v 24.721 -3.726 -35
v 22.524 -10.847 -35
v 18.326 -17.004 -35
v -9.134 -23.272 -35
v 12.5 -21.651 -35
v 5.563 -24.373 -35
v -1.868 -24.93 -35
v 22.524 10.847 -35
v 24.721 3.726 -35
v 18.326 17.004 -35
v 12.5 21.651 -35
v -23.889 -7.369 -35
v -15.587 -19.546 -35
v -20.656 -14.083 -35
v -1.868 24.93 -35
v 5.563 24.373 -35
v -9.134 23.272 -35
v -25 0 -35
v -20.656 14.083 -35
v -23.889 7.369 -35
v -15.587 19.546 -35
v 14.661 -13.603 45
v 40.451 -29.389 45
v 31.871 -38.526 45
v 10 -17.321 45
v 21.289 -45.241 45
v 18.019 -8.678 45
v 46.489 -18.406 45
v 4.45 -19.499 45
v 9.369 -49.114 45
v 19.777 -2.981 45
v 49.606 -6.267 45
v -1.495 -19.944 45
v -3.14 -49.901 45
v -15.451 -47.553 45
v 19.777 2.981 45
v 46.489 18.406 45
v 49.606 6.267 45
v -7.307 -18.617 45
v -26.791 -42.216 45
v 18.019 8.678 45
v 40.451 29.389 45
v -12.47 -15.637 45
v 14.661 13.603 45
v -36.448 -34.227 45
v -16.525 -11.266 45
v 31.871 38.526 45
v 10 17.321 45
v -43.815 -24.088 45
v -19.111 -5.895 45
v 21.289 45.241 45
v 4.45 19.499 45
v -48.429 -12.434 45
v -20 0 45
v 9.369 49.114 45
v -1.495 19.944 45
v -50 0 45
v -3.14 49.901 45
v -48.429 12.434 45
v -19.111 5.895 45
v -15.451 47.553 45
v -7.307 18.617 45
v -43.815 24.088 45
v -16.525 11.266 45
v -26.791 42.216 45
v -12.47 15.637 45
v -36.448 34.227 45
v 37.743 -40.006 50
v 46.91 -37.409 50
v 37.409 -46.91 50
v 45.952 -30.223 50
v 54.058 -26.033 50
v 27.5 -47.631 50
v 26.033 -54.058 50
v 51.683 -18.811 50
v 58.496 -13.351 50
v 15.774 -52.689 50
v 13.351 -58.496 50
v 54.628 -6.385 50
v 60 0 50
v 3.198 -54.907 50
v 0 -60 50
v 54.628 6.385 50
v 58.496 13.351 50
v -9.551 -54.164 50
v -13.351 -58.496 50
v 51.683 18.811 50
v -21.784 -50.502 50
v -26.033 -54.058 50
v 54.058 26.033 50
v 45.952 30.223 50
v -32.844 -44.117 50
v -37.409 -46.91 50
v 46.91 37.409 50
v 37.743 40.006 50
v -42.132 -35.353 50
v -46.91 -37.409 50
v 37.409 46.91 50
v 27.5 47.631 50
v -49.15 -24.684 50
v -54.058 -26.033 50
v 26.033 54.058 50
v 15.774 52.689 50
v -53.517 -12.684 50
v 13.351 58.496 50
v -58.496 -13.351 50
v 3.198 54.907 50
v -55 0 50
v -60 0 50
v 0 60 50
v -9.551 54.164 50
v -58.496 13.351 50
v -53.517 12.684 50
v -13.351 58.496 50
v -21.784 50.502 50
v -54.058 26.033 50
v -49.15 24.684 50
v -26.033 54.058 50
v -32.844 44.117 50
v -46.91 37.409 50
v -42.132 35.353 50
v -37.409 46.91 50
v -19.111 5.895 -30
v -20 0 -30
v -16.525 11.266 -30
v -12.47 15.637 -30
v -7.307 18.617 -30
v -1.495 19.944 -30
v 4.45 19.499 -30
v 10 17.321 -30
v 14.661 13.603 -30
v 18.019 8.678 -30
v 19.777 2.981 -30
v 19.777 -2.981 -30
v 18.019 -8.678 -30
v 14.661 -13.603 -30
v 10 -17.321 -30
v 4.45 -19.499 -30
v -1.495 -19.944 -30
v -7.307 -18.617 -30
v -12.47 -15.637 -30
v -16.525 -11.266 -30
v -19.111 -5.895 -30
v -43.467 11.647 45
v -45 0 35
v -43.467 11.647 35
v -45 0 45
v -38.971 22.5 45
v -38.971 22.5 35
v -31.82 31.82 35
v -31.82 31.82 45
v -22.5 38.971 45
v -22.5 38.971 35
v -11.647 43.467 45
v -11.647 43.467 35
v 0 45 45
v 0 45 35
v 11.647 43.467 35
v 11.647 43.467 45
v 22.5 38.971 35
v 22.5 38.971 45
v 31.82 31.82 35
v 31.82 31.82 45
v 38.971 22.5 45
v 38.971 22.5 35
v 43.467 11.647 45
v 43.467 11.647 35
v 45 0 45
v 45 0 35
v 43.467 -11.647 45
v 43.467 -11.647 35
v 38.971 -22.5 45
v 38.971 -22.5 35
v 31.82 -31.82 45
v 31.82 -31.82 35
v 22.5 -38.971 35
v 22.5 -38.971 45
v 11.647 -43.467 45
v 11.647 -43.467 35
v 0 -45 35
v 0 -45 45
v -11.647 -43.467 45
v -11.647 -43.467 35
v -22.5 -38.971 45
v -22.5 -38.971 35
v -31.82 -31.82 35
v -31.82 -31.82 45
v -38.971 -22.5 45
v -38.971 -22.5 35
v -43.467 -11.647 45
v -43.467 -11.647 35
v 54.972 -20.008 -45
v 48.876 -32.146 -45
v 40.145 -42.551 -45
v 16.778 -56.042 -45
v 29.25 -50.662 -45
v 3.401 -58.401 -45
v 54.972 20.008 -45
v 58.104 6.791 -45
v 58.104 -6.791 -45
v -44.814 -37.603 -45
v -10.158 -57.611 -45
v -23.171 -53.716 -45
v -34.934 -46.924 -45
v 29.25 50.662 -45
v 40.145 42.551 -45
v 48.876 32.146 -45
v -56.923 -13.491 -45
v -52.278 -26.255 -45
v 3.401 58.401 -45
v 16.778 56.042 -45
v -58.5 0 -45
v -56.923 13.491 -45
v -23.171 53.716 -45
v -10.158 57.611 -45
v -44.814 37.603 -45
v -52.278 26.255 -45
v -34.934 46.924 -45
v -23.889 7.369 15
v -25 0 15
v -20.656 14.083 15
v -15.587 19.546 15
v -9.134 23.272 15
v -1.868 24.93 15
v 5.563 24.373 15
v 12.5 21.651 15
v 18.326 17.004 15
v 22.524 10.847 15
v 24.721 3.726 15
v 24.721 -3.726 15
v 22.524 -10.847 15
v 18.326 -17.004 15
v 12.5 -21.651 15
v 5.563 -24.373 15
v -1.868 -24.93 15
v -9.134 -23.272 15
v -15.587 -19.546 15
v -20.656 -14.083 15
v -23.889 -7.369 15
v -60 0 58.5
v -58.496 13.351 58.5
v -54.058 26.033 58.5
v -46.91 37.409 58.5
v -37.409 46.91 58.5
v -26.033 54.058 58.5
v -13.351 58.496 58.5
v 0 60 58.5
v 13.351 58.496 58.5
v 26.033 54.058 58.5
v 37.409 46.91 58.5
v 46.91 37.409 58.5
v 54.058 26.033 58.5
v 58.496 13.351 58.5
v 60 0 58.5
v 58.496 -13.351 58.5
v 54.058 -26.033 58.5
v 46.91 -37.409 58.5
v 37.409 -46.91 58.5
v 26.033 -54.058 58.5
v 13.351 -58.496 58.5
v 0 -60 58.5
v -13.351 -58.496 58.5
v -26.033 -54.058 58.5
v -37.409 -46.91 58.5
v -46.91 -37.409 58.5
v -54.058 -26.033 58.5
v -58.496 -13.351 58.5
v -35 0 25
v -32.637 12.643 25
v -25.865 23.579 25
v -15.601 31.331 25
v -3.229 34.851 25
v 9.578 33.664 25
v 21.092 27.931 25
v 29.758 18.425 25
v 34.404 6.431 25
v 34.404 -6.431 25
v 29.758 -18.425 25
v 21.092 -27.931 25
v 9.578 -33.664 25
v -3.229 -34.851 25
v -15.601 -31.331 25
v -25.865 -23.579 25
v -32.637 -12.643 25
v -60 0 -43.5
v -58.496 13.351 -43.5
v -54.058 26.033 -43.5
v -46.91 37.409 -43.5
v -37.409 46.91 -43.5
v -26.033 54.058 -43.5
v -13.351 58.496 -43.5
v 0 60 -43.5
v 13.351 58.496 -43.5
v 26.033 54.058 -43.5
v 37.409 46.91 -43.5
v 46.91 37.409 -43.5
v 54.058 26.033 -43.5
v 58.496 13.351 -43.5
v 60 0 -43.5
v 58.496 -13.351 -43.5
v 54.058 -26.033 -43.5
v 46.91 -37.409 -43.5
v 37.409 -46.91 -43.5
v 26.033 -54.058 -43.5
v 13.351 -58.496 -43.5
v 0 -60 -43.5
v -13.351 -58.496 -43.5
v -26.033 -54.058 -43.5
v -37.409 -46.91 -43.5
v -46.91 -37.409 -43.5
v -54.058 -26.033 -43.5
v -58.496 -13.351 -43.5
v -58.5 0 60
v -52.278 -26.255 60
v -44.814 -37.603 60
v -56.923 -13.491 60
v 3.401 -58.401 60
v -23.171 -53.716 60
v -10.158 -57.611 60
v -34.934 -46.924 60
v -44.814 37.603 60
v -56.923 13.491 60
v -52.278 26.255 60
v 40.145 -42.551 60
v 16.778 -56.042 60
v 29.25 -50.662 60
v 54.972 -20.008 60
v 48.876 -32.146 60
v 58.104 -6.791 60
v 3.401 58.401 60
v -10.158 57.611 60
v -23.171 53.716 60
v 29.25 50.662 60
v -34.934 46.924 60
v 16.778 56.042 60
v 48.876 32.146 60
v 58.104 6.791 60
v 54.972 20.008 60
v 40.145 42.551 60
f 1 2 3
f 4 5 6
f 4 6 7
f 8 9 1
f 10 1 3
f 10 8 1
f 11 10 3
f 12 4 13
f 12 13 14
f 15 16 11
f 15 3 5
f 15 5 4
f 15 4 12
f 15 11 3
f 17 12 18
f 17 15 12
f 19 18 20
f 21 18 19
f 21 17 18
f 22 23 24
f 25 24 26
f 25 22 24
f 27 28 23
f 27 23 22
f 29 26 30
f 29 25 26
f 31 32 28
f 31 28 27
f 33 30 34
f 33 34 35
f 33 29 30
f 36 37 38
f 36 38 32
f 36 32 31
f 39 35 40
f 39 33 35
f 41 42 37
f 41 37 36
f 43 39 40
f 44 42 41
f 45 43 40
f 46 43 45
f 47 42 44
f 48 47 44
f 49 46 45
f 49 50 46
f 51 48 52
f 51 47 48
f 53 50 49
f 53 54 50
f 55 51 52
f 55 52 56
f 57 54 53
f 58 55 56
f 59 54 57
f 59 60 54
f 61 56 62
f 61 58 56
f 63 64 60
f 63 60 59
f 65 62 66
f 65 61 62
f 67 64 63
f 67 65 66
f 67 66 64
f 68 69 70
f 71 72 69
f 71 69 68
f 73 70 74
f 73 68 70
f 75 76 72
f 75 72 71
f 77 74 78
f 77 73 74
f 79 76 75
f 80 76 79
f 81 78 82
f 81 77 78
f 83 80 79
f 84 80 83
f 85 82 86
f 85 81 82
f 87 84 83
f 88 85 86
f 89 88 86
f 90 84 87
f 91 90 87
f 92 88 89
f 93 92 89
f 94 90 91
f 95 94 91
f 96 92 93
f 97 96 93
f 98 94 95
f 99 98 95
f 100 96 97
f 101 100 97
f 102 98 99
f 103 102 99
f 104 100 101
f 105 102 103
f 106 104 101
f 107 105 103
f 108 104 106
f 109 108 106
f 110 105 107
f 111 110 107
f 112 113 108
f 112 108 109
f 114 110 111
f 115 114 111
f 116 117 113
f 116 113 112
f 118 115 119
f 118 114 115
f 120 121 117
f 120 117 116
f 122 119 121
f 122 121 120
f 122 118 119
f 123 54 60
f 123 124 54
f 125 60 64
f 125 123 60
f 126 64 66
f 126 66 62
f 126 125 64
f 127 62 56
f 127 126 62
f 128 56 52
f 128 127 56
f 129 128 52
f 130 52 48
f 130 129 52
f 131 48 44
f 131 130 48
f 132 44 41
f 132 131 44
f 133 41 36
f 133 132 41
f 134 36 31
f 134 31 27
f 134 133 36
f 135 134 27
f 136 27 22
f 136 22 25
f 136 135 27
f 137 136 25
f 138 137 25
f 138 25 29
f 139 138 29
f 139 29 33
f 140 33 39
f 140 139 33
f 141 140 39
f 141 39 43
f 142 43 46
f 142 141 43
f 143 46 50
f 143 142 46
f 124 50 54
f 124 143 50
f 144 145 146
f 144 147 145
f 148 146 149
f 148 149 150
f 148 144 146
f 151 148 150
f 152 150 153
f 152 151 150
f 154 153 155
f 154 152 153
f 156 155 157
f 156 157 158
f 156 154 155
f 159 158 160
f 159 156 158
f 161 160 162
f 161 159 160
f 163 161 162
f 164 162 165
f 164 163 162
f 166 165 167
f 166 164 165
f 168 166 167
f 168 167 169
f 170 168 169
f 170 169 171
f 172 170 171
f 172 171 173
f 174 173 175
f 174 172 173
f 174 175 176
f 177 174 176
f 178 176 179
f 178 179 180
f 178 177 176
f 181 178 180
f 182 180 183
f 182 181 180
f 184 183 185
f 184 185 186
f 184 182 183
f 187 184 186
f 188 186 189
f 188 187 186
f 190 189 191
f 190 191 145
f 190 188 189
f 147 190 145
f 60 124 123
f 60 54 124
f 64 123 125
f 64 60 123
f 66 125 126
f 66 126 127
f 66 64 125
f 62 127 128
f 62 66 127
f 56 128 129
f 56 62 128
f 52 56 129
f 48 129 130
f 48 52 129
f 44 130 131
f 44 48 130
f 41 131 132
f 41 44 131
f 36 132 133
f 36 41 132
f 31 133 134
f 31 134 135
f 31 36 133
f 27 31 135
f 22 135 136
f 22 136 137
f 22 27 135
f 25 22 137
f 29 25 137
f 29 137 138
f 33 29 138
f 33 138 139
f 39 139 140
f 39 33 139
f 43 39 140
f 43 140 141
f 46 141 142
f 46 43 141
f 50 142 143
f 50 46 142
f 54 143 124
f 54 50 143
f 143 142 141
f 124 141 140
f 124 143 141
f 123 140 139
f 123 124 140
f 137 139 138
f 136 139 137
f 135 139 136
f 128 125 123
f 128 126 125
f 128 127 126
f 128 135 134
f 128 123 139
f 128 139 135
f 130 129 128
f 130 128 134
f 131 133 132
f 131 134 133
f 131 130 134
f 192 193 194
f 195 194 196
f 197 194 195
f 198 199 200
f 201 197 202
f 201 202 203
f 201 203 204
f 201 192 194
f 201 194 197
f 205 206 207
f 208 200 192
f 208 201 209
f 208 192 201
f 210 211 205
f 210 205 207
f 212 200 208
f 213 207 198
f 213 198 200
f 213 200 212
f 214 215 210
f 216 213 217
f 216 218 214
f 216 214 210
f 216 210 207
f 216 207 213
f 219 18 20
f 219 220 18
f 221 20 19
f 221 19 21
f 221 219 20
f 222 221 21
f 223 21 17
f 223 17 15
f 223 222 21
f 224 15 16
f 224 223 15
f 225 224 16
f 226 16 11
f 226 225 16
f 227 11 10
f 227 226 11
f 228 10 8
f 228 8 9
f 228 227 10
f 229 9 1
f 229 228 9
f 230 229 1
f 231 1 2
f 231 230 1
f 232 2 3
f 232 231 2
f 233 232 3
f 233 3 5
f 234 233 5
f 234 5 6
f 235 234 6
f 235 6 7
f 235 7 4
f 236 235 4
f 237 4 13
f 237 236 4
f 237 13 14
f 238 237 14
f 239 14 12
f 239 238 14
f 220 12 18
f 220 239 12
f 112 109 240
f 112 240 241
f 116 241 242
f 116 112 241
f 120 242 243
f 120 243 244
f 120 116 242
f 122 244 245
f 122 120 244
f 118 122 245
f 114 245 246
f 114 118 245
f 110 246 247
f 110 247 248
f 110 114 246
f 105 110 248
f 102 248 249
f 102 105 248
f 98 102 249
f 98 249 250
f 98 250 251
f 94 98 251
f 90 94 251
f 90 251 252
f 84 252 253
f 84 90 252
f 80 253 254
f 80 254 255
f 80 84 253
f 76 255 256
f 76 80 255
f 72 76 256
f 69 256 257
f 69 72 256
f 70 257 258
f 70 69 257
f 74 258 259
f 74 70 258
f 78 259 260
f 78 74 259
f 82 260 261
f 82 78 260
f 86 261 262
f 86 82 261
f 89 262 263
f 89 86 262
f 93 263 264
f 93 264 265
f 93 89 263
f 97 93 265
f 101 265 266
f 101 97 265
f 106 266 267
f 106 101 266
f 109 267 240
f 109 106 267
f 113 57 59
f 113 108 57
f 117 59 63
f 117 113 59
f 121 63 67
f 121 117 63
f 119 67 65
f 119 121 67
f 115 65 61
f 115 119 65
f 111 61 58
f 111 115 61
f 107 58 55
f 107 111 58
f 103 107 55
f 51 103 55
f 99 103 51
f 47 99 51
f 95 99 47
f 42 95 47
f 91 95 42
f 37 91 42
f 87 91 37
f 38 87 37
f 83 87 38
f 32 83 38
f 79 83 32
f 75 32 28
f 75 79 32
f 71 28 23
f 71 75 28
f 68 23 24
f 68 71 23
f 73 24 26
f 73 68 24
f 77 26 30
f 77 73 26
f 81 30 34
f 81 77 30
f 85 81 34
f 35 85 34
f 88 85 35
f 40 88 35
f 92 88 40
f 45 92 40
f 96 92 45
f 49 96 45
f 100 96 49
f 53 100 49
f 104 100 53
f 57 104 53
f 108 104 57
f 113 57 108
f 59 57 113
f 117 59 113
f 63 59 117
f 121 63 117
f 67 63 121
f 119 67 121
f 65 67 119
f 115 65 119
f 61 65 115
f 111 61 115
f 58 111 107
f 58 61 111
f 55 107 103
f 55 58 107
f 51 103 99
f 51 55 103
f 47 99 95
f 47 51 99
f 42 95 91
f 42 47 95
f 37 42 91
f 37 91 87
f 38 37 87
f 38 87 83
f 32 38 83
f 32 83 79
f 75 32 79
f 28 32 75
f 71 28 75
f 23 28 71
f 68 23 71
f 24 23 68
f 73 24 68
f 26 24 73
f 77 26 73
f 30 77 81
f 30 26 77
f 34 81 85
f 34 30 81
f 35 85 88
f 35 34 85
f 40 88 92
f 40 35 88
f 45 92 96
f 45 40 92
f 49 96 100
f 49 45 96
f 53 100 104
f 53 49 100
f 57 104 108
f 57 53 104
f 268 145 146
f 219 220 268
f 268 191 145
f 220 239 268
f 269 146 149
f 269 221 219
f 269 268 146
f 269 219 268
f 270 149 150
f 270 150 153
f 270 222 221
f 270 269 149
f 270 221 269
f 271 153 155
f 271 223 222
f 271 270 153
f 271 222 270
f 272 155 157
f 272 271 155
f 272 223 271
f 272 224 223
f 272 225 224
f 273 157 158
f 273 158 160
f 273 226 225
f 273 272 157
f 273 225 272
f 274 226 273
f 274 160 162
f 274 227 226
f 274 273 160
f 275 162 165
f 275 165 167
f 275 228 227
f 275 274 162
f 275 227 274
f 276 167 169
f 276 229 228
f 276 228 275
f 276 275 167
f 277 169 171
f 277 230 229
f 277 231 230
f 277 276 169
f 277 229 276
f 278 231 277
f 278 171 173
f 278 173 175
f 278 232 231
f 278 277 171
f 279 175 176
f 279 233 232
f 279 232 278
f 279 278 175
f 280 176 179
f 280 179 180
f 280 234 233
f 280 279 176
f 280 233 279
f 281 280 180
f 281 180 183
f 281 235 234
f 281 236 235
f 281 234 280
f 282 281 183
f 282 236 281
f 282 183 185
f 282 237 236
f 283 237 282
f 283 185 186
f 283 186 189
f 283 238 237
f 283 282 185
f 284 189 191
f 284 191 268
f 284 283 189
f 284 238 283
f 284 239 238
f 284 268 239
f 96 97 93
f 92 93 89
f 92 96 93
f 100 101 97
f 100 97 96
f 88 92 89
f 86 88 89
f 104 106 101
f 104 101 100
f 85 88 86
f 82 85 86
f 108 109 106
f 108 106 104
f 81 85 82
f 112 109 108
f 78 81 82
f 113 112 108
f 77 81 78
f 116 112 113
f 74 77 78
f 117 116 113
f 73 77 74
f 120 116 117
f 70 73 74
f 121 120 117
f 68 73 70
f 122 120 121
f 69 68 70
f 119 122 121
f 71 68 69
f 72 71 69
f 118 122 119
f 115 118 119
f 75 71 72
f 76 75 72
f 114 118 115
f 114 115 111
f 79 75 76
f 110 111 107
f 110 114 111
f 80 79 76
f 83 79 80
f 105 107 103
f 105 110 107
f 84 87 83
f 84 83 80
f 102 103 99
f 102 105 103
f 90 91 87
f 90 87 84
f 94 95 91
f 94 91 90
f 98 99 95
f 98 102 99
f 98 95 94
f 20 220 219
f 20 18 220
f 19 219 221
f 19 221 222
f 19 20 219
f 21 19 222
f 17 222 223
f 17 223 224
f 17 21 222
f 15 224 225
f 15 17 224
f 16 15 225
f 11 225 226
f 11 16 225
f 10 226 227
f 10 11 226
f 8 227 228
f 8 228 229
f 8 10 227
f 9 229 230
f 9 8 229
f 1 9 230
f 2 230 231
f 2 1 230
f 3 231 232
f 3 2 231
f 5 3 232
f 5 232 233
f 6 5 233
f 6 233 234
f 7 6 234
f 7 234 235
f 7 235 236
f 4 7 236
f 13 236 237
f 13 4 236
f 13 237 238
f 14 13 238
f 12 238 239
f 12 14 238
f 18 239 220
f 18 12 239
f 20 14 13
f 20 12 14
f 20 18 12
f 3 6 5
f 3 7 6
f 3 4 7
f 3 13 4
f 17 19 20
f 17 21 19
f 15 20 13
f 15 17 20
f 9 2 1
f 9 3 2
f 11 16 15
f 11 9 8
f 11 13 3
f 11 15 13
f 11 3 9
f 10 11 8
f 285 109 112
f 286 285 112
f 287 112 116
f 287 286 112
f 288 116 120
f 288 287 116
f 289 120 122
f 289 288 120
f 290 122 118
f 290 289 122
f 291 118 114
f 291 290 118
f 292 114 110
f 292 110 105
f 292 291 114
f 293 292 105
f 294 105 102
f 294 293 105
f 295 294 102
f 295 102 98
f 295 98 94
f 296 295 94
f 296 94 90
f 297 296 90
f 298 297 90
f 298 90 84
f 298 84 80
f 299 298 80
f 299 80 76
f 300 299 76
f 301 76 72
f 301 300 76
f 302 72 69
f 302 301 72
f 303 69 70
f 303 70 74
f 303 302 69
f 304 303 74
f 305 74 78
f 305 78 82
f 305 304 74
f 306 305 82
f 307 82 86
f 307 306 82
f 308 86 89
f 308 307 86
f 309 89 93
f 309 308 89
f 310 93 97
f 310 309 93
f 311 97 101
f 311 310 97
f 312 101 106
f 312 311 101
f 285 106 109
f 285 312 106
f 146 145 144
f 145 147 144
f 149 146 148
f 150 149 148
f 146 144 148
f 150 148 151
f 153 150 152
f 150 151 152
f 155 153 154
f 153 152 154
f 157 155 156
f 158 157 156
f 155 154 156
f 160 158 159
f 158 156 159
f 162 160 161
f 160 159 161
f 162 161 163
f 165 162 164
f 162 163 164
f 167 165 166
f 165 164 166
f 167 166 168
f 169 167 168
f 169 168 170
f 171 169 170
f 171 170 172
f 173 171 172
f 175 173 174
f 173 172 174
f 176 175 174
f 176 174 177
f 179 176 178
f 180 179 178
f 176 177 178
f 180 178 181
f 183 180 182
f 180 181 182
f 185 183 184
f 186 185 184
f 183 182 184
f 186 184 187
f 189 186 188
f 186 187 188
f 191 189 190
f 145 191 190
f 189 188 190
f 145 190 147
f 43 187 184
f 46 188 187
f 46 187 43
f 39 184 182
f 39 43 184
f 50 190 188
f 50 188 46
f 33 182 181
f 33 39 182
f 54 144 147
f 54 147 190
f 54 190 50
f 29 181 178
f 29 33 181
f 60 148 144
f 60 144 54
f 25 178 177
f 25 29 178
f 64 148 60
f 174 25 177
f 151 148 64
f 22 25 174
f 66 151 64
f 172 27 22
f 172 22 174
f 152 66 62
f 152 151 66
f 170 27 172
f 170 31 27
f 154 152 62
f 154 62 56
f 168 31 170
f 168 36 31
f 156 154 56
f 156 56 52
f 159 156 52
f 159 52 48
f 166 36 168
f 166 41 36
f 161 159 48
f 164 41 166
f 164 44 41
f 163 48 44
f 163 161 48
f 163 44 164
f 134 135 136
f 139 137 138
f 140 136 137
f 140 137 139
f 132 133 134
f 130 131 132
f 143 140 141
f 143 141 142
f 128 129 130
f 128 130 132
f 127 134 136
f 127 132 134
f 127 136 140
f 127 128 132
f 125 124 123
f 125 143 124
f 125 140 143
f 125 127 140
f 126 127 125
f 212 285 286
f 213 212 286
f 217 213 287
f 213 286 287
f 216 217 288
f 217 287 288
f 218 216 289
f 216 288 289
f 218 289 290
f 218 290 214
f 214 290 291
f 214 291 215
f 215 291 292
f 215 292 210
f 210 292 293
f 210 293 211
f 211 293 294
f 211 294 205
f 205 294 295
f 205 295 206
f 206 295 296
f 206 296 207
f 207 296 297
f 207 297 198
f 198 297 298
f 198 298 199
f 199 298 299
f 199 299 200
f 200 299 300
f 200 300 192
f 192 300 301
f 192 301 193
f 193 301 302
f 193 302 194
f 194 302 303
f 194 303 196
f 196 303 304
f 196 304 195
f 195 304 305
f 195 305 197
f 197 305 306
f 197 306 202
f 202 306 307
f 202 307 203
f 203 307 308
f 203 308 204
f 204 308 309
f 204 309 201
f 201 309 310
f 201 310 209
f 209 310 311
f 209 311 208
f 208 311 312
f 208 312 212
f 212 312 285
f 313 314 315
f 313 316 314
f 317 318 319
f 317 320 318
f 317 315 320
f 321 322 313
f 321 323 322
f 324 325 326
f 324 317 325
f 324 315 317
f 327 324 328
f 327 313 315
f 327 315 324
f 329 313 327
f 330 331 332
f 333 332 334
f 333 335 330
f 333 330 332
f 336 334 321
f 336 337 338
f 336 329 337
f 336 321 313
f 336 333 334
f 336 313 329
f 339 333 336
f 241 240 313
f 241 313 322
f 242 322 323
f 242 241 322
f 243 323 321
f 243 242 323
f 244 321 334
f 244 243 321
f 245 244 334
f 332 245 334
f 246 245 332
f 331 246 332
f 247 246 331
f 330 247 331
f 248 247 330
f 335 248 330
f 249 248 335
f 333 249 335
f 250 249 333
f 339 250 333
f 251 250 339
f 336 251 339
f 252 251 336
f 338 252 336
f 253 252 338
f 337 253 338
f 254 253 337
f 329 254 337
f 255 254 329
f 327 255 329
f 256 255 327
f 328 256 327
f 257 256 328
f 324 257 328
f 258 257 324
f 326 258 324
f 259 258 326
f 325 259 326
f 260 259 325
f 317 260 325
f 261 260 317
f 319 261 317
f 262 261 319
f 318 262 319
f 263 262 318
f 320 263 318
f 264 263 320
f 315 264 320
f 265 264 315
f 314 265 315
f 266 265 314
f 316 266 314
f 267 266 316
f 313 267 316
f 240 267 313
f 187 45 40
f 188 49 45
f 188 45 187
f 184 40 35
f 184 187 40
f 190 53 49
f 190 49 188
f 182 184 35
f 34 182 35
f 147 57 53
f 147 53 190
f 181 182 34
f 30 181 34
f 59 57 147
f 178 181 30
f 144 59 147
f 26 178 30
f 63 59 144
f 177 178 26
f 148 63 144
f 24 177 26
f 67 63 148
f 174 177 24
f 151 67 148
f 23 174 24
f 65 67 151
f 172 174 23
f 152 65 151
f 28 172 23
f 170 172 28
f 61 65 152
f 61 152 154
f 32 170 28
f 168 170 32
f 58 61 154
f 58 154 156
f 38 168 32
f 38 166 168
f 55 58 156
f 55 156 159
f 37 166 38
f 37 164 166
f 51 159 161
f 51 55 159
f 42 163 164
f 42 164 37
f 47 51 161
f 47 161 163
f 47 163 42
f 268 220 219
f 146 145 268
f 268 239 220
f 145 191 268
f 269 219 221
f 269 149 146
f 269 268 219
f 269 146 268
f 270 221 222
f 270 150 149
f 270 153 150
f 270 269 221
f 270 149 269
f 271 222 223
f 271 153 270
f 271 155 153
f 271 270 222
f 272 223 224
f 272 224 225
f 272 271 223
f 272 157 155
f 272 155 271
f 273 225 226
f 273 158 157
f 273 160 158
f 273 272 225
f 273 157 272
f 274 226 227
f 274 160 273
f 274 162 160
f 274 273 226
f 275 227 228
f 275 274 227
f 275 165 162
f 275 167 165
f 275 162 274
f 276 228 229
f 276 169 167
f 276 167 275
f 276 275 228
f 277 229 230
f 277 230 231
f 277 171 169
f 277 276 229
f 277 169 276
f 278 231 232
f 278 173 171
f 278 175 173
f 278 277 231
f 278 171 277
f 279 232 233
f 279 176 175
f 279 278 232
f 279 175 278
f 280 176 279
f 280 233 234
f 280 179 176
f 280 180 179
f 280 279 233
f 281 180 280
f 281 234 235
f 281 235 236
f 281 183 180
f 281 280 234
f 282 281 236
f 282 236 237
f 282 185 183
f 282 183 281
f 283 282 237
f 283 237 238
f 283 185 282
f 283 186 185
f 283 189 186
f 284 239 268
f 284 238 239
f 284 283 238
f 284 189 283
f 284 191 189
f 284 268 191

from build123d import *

# Parameters (mm, degrees)
F0_W    = 20
F0_H    = 10
F0_W_2  = 5
F4_SIZE = 1.5
F5_SIZE = 1.5


# Not quite as in the source:
# - a feature names something its author has since deleted; it is built from what else it names


with BuildPart() as f1:
    # F0 (on Front) → F1 (revolve)
    with BuildSketch(Plane.XZ):
        Polygon((-60, 45), (-60, 35), (-45, 35), (-45, 45), (-50, 45), align=None)
        Polygon((-60, -45), (0, -45), (0, -35), (-25, -35), (-25, 15), (-45, 35), (-60, 35), align=None)
        Polygon((-55, 50), (-60, 50), (-60, 45), (-50, 45), align=None)
    revolve(axis=Axis((0, 0, 13.6922076344), (0, 0, -1)))

    # F5
    f5_edges = [f1.edges().sort_by_distance(p)[0] for p in [
        (60, 0, -45),
    ]]
    chamfer(f5_edges, length=F5_SIZE)


with BuildPart() as f2:
    # F0 (on Front) → F2 (revolve)
    with BuildSketch(Plane.XZ):
        Polygon((0, -30), (0, 35), (-20, 35), (-20, 30), (-20, -30), align=None)
        with Locations((-10, 40)):
            Rectangle(F0_W, F0_H)
        Polygon((0, 45), (0, 60), (-60, 60), (-60, 50), (-55, 50), (-50, 45), (-45, 45), (-25, 45), (-20, 45), align=None)
    revolve(axis=Axis((0, 0, 13.6922076344), (0, 0, -1)))

    # F4
    f4_edges = [f2.edges().sort_by_distance(p)[0] for p in [
        (60, 0, 60),
    ]]
    chamfer(f4_edges, length=F4_SIZE)


with BuildPart() as f3:
    # F0 (on Front) → F3 (revolve)
    with BuildSketch(Plane.XZ):
        with Locations((-35, 40)):
            Rectangle(F0_W, F0_H)
        with Locations((-22.5, 40)):
            Rectangle(F0_W_2, F0_H)
        Polygon((-25, -35), (0, -35), (0, -30), (-20, -30), (-20, 30), (-20, 35), (-25, 35), (-25, 15), align=None)
        Polygon((-25, 35), (-45, 35), (-25, 15), align=None)
    revolve(axis=Axis((0, 0, 13.6922076344), (0, 0, -1)))


solid = Compound([f1.part, f2.part, f3.part])
